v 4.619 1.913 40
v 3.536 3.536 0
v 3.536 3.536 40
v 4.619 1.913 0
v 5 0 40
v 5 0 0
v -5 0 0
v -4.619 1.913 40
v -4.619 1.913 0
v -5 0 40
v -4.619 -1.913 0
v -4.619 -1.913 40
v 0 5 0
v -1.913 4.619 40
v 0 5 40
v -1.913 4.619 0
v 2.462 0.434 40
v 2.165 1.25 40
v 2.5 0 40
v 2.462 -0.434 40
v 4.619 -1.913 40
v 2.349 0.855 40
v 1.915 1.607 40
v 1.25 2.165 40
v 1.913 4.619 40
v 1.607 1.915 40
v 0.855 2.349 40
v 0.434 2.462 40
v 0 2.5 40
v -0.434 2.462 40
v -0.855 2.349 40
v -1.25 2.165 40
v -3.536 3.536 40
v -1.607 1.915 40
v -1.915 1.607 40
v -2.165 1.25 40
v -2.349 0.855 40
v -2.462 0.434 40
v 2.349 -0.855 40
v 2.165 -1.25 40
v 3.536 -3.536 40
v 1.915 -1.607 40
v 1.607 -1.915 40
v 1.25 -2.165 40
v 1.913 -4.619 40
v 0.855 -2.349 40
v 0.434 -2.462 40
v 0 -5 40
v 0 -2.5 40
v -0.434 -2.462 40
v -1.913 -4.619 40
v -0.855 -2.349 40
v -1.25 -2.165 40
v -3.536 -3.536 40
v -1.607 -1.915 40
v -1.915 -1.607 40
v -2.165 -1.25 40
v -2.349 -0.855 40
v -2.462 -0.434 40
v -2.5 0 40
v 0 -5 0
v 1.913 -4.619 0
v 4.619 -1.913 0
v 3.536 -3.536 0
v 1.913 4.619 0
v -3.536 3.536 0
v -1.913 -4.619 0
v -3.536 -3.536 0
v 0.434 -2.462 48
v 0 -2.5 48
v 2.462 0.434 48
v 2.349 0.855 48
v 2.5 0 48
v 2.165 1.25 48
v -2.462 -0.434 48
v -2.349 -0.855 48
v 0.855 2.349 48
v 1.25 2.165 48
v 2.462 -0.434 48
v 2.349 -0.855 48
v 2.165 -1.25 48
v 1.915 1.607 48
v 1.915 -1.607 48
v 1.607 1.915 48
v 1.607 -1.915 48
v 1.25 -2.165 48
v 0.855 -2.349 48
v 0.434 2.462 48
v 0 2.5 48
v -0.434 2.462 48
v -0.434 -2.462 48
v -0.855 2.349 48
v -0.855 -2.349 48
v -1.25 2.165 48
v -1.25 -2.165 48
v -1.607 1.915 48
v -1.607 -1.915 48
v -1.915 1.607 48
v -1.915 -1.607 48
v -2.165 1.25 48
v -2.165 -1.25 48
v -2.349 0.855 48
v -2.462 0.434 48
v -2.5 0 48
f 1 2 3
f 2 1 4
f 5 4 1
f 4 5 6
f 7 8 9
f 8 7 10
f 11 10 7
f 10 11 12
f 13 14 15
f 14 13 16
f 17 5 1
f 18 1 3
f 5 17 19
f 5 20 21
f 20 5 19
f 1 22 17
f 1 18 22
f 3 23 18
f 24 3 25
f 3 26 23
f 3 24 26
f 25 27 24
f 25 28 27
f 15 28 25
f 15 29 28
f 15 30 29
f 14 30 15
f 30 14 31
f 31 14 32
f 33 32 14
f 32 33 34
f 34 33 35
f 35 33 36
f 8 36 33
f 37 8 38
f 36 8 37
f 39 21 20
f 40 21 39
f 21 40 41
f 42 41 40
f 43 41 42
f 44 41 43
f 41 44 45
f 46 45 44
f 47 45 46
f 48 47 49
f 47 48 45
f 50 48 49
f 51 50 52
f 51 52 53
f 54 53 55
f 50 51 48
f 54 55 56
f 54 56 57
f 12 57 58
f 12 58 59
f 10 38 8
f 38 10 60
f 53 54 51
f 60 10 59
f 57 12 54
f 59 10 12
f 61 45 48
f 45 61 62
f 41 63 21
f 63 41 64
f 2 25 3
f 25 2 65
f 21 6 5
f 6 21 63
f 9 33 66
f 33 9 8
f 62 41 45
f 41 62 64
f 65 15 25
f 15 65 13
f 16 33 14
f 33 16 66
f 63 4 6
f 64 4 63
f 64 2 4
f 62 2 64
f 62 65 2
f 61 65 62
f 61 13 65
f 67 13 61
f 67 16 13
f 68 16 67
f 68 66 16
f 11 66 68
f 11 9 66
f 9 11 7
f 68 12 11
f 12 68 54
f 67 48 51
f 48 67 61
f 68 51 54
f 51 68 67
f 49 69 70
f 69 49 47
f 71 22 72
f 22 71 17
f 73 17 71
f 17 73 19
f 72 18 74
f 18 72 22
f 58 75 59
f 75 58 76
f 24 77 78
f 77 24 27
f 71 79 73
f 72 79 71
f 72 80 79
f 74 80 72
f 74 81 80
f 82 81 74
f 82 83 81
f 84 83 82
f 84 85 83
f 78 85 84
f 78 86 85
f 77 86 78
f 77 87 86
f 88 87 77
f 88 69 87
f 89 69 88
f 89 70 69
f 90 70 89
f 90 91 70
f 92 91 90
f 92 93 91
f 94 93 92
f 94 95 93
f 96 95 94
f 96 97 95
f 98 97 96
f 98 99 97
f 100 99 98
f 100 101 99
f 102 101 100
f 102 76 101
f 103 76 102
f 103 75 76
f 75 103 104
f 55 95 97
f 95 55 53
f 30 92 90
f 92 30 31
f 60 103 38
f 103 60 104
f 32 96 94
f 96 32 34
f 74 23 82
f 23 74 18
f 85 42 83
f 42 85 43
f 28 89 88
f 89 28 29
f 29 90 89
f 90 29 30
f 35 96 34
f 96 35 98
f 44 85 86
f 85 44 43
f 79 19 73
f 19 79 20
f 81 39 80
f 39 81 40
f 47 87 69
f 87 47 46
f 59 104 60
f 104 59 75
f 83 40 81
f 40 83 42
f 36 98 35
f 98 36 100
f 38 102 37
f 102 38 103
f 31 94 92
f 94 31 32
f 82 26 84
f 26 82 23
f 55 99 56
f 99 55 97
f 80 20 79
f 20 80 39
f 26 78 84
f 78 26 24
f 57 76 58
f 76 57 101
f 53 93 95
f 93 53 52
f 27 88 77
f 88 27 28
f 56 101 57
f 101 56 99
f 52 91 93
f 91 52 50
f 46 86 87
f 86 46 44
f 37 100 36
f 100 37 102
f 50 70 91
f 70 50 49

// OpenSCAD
union() {
	union() {
		cylinder(h = 40, r = 5);
		cylinder($fn = 36, h = 48, r = 2.5000000000);
	}
}
